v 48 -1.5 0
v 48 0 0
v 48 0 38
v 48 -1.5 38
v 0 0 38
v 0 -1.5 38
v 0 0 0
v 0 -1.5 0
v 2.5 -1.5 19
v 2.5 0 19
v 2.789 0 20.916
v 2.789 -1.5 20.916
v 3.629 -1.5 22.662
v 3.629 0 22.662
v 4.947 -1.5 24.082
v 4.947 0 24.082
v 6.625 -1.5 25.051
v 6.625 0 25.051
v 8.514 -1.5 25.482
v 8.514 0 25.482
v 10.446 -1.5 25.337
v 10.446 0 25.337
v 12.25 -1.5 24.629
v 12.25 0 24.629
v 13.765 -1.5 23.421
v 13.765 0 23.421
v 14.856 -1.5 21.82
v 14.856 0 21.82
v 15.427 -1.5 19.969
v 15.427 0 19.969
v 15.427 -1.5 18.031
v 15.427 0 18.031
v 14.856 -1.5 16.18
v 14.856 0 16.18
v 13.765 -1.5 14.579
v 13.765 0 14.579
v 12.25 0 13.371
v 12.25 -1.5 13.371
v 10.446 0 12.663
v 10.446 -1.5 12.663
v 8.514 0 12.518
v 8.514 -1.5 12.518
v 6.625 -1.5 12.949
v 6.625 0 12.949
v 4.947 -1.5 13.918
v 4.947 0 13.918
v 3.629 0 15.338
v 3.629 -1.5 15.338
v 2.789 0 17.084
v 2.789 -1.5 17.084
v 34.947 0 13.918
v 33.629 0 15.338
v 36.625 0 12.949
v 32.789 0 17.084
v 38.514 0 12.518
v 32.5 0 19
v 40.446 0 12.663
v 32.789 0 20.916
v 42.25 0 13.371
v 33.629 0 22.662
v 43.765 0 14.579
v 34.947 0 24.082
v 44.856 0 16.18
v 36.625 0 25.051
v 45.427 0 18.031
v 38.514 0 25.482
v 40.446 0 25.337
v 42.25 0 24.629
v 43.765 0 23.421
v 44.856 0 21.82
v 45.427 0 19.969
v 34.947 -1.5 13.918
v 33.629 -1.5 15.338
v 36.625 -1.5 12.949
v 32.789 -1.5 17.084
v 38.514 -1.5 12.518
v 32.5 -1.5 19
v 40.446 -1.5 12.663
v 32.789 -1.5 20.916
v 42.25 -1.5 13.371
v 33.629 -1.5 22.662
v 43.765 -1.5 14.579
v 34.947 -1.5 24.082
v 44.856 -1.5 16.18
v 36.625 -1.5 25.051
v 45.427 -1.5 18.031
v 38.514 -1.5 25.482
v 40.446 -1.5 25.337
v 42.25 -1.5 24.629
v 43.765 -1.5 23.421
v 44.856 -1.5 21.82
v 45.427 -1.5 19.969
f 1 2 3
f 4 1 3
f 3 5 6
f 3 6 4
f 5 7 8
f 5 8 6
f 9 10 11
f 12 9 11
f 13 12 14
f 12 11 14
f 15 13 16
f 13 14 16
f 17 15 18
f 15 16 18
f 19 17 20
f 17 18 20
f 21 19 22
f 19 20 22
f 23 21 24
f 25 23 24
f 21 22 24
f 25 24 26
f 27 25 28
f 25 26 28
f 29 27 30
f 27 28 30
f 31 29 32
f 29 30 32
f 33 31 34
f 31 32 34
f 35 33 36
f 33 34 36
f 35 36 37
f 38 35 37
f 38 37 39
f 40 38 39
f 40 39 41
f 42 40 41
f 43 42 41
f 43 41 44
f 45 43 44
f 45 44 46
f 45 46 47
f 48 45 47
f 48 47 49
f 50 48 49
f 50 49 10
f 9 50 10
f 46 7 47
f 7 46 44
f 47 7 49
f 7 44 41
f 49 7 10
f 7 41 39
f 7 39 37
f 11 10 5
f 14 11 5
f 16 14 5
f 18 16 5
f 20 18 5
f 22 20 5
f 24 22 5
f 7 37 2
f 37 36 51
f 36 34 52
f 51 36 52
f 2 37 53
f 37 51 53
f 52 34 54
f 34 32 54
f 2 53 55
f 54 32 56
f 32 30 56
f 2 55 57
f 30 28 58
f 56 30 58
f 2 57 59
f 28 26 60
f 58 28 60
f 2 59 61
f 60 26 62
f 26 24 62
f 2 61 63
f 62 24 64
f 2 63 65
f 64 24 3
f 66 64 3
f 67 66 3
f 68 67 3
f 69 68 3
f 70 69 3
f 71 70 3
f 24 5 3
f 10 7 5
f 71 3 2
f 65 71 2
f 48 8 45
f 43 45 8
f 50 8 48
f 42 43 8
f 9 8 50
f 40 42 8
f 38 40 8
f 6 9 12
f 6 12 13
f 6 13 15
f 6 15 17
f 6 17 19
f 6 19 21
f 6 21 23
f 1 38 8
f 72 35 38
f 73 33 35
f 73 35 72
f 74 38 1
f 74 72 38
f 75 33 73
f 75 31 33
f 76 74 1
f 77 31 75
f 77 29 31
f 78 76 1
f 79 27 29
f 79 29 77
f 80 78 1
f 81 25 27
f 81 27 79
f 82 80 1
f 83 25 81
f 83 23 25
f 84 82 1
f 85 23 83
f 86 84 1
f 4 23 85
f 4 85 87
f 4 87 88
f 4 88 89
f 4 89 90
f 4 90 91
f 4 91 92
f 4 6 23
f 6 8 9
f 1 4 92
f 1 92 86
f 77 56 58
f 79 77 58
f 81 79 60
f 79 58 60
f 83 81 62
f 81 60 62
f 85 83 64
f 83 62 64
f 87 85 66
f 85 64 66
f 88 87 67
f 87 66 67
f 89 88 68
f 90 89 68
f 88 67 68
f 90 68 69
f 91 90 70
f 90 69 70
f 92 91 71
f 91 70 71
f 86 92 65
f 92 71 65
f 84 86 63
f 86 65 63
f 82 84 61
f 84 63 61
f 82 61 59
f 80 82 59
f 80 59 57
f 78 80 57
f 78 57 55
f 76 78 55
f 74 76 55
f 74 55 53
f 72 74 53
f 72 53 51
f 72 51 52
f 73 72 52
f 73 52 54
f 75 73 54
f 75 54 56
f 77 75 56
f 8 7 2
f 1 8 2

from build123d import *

# Parameters (mm, degrees)
F0_W     = 48
F0_H     = 38
F1_DEPTH = 1.5
F3_D     = 13
F3_DEPTH = 10


with BuildPart() as f1:
    # F0 (on Front) → F1 (new body)
    with BuildSketch(Plane.XZ):
        with Locations((24, 19)):
            Rectangle(F0_W, F0_H)
    extrude(amount=F1_DEPTH)

    # F3
    with Locations(Plane.XZ.offset(1.5)):
        with Locations((9, 19), (39, 19)):
            Hole(F3_D / 2, depth=F3_DEPTH)


solid = f1.part
